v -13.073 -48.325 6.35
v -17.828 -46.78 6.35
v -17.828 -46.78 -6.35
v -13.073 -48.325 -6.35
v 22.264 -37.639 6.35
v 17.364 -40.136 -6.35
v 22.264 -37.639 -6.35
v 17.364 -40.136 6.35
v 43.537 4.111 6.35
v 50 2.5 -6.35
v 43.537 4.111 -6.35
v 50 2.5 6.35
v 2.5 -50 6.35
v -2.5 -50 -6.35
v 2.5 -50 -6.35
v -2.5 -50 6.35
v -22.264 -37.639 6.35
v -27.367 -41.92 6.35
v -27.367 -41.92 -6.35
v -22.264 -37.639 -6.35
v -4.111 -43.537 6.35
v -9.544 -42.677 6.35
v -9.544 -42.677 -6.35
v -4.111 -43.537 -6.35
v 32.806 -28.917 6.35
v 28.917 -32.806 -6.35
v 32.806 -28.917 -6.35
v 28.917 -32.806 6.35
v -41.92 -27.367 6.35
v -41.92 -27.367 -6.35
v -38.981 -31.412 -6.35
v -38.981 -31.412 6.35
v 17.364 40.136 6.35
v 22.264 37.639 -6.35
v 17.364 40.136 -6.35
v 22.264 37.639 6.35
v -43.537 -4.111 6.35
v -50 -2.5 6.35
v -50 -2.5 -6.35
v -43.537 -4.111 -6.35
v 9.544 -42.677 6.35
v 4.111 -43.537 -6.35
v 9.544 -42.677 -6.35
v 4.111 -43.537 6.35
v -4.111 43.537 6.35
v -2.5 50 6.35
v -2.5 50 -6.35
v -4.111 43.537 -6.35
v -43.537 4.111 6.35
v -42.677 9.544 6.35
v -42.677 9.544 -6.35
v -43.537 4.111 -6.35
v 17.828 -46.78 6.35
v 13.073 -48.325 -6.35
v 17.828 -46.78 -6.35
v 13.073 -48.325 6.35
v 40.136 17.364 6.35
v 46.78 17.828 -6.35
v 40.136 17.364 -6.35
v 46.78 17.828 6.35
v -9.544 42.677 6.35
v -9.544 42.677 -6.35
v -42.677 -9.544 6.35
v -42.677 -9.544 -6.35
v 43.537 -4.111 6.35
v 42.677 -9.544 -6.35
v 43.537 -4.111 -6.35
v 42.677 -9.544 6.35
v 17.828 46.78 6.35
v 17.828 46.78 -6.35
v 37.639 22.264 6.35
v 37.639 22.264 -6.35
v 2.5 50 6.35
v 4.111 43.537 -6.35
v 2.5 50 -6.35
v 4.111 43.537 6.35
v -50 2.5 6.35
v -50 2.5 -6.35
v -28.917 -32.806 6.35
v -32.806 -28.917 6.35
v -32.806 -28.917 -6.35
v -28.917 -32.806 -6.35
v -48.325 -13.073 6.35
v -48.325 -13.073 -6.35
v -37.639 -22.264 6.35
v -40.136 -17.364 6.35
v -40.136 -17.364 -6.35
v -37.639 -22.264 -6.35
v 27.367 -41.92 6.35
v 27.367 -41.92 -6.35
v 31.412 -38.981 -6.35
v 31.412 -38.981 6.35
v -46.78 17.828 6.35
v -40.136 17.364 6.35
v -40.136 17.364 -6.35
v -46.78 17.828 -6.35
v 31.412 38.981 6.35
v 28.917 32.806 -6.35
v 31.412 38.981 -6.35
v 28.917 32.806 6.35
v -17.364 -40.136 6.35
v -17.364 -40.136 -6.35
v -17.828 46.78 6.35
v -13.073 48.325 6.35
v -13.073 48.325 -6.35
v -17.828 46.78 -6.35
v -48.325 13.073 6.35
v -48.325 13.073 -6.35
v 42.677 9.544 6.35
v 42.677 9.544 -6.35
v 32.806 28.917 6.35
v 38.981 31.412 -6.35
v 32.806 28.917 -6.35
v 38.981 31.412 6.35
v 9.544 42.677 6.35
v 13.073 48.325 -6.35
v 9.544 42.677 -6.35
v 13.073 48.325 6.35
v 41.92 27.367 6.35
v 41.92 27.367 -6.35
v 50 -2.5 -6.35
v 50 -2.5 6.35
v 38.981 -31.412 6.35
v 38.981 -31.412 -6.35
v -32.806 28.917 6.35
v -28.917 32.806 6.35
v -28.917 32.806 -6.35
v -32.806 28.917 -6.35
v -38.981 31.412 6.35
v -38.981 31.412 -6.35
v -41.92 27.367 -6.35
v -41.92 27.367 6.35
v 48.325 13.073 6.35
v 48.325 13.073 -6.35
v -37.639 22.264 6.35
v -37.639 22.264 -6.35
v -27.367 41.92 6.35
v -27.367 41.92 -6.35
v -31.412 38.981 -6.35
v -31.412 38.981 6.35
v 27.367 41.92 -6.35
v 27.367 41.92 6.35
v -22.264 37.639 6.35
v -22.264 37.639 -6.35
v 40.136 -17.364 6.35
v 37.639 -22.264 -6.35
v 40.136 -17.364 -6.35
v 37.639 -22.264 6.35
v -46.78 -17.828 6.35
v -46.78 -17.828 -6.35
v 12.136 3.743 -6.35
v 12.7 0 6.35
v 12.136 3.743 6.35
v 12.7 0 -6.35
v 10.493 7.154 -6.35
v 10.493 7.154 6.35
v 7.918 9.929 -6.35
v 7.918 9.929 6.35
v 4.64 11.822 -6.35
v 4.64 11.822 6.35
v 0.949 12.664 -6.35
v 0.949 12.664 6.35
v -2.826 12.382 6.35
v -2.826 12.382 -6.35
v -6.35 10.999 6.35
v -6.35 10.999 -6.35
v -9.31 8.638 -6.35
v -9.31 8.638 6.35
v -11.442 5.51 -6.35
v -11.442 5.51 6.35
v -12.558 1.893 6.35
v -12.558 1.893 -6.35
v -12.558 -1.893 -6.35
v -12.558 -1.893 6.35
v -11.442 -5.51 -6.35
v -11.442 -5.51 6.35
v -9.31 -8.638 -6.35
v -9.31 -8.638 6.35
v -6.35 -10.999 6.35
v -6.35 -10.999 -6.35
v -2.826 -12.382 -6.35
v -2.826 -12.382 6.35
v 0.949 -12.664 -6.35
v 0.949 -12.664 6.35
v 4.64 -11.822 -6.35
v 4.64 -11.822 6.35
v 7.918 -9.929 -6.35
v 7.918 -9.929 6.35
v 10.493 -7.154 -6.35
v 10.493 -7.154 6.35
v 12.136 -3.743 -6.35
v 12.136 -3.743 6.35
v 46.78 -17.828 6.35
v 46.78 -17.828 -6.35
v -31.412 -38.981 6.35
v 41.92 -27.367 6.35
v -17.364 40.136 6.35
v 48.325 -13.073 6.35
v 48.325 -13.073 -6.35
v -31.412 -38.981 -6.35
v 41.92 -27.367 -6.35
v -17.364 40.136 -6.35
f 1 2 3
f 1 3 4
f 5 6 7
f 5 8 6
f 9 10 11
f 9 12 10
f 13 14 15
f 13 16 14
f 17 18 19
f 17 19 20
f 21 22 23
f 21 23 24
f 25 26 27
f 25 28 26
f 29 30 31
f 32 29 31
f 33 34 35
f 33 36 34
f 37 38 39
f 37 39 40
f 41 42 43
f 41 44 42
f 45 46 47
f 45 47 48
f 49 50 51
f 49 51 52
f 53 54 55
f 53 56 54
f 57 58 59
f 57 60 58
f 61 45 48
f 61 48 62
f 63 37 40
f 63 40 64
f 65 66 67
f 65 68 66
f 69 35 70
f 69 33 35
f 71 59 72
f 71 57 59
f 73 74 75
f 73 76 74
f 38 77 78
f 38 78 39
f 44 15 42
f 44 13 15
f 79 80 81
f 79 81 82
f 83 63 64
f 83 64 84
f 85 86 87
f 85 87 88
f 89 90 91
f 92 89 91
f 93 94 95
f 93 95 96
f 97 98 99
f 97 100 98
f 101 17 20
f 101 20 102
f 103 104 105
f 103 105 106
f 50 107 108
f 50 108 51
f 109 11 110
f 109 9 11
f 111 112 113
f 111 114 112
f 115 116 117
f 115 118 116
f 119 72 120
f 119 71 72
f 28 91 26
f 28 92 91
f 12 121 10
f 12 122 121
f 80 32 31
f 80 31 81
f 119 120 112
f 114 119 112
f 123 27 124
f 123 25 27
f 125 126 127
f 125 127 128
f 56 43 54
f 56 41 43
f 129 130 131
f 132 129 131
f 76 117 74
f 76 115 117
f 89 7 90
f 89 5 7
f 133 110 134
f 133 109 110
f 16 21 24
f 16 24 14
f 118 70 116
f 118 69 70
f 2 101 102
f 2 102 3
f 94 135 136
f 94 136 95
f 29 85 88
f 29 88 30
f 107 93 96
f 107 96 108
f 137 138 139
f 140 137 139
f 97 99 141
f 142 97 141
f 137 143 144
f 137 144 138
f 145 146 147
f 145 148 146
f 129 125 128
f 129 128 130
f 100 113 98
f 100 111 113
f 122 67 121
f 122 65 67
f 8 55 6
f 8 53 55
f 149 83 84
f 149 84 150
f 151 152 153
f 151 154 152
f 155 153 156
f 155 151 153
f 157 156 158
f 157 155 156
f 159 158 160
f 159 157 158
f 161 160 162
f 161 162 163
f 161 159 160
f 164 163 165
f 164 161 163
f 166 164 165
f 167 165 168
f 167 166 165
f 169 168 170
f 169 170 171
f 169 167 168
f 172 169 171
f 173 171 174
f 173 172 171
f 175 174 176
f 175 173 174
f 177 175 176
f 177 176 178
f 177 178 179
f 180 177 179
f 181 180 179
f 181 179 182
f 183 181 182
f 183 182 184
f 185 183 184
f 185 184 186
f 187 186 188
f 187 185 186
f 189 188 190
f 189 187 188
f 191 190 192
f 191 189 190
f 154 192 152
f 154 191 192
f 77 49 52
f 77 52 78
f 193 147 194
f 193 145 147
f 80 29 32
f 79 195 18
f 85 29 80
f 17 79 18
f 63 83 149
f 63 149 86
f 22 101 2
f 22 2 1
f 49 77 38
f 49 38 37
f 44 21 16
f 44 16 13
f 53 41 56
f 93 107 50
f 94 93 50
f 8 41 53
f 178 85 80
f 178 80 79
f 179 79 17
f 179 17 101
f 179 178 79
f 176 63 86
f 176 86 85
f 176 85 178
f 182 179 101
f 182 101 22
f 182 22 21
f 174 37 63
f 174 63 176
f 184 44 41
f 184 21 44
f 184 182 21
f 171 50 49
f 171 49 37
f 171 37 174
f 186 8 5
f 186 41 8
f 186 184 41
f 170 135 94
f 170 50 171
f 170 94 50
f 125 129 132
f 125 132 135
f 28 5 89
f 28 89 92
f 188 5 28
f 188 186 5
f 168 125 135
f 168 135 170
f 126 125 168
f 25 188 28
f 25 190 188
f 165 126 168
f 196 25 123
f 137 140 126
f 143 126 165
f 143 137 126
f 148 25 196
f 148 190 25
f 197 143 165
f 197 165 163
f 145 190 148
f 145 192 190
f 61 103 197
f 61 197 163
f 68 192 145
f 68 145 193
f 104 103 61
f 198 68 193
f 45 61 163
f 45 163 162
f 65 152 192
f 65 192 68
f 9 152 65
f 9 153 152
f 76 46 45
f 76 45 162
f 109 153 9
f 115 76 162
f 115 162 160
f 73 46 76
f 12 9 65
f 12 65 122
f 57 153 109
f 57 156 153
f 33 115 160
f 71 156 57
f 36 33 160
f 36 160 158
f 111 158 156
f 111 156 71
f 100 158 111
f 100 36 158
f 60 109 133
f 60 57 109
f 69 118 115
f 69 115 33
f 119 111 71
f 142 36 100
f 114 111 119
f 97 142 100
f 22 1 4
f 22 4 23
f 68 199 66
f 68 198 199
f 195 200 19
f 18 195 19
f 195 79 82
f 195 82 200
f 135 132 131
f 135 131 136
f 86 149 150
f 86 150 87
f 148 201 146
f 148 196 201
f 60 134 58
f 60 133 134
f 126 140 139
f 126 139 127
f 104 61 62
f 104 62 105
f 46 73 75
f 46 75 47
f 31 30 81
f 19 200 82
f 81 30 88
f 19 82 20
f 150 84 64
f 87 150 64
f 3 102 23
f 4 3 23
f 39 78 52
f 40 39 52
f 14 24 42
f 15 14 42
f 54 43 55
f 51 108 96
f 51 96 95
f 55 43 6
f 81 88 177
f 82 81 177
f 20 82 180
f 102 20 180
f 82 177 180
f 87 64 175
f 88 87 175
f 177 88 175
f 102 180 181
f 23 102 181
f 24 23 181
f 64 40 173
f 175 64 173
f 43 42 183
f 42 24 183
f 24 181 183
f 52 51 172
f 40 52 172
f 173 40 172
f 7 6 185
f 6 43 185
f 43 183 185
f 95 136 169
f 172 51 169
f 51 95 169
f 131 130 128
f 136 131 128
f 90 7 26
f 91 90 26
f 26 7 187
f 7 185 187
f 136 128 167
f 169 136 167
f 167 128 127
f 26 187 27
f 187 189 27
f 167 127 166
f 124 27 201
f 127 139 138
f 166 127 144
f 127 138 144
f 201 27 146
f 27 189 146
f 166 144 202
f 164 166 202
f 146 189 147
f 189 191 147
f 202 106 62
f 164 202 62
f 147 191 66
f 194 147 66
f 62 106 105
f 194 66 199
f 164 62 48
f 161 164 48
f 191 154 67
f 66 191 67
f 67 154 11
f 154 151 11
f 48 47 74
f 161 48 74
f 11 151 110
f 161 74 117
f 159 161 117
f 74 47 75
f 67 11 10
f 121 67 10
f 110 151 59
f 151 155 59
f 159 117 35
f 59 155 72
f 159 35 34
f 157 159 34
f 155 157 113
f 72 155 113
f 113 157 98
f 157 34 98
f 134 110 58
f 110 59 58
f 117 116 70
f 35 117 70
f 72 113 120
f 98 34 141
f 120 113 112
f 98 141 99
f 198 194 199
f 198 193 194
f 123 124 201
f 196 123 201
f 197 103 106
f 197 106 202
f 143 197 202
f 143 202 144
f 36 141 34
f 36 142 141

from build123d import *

# Parameters (mm, degrees)
F0_R     = 12.7
F1_DEPTH = 6.35


# Not quite as in the source:
# - a feature of the source that left no trace in its solid (it failed there, or was rolled back) is left out


with BuildPart() as f1:
    # F0 (on Top) → F1 (new body, symmetric)
    with BuildSketch(Plane.XY):
        Polygon((4.1113441396, 43.5372516477), (2.5, 50), (-2.5, 50), (-4.1113441396, 43.5372516477), (-9.5436300128, 42.6768620899), (-13.073208428, 48.3253683007), (-17.8284910095, 46.7802833288), (-17.3638712822, 40.1359116722), (-22.2644071652, 37.6389639237), (-27.3667201287, 41.9203128495), (-31.4118051006, 38.981386588), (-28.9167017225, 32.805789019), (-32.805789019, 28.9167017225), (-38.981386588, 31.4118051006), (-41.9203128495, 27.3667201287), (-37.6389639237, 22.2644071652), (-40.1359116722, 17.3638712822), (-46.7802833288, 17.8284910095), (-48.3253683007, 13.073208428), (-42.6768620899, 9.5436300128), (-43.5372516477, 4.1113441396), (-50, 2.5), (-50, -2.5), (-43.5372516477, -4.1113441396), (-42.6768620899, -9.5436300128), (-48.3253683007, -13.073208428), (-46.7802833288, -17.8284910095), (-40.1359116722, -17.3638712822), (-37.6389639237, -22.2644071652), (-41.9203128495, -27.3667201287), (-38.981386588, -31.4118051006), (-32.805789019, -28.9167017225), (-28.9167017225, -32.805789019), (-31.4118051006, -38.981386588), (-27.3667201287, -41.9203128495), (-22.2644071652, -37.6389639237), (-17.3638712822, -40.1359116722), (-17.8284910095, -46.7802833288), (-13.073208428, -48.3253683007), (-9.5436300128, -42.6768620899), (-4.1113441396, -43.5372516477), (-2.5, -50), (2.5, -50), (4.1113441396, -43.5372516477), (9.5436300128, -42.6768620899), (13.073208428, -48.3253683007), (17.8284910095, -46.7802833288), (17.3638712822, -40.1359116722), (22.2644071652, -37.6389639237), (27.3667201287, -41.9203128495), (31.4118051006, -38.981386588), (28.9167017225, -32.805789019), (32.805789019, -28.9167017225), (38.981386588, -31.4118051006), (41.9203128495, -27.3667201287), (37.6389639237, -22.2644071652), (40.1359116722, -17.3638712822), (46.7802833288, -17.8284910095), (48.3253683007, -13.073208428), (42.6768620899, -9.5436300128), (43.5372516477, -4.1113441396), (50, -2.5), (50, 2.5), (43.5372516477, 4.1113441396), (42.6768620899, 9.5436300128), (48.3253683007, 13.073208428), (46.7802833288, 17.8284910095), (40.1359116722, 17.3638712822), (37.6389639237, 22.2644071652), (41.9203128495, 27.3667201287), (38.981386588, 31.4118051006), (32.805789019, 28.9167017225), (28.9167017225, 32.805789019), (31.4118051006, 38.981386588), (27.3667201287, 41.9203128495), (22.2644071652, 37.6389639237), (17.3638712822, 40.1359116722), (17.8284910095, 46.7802833288), (13.073208428, 48.3253683007), (9.5436300128, 42.6768620899), align=None)
        Circle(F0_R, mode=Mode.SUBTRACT)
    extrude(amount=F1_DEPTH, both=True)


solid = f1.part
